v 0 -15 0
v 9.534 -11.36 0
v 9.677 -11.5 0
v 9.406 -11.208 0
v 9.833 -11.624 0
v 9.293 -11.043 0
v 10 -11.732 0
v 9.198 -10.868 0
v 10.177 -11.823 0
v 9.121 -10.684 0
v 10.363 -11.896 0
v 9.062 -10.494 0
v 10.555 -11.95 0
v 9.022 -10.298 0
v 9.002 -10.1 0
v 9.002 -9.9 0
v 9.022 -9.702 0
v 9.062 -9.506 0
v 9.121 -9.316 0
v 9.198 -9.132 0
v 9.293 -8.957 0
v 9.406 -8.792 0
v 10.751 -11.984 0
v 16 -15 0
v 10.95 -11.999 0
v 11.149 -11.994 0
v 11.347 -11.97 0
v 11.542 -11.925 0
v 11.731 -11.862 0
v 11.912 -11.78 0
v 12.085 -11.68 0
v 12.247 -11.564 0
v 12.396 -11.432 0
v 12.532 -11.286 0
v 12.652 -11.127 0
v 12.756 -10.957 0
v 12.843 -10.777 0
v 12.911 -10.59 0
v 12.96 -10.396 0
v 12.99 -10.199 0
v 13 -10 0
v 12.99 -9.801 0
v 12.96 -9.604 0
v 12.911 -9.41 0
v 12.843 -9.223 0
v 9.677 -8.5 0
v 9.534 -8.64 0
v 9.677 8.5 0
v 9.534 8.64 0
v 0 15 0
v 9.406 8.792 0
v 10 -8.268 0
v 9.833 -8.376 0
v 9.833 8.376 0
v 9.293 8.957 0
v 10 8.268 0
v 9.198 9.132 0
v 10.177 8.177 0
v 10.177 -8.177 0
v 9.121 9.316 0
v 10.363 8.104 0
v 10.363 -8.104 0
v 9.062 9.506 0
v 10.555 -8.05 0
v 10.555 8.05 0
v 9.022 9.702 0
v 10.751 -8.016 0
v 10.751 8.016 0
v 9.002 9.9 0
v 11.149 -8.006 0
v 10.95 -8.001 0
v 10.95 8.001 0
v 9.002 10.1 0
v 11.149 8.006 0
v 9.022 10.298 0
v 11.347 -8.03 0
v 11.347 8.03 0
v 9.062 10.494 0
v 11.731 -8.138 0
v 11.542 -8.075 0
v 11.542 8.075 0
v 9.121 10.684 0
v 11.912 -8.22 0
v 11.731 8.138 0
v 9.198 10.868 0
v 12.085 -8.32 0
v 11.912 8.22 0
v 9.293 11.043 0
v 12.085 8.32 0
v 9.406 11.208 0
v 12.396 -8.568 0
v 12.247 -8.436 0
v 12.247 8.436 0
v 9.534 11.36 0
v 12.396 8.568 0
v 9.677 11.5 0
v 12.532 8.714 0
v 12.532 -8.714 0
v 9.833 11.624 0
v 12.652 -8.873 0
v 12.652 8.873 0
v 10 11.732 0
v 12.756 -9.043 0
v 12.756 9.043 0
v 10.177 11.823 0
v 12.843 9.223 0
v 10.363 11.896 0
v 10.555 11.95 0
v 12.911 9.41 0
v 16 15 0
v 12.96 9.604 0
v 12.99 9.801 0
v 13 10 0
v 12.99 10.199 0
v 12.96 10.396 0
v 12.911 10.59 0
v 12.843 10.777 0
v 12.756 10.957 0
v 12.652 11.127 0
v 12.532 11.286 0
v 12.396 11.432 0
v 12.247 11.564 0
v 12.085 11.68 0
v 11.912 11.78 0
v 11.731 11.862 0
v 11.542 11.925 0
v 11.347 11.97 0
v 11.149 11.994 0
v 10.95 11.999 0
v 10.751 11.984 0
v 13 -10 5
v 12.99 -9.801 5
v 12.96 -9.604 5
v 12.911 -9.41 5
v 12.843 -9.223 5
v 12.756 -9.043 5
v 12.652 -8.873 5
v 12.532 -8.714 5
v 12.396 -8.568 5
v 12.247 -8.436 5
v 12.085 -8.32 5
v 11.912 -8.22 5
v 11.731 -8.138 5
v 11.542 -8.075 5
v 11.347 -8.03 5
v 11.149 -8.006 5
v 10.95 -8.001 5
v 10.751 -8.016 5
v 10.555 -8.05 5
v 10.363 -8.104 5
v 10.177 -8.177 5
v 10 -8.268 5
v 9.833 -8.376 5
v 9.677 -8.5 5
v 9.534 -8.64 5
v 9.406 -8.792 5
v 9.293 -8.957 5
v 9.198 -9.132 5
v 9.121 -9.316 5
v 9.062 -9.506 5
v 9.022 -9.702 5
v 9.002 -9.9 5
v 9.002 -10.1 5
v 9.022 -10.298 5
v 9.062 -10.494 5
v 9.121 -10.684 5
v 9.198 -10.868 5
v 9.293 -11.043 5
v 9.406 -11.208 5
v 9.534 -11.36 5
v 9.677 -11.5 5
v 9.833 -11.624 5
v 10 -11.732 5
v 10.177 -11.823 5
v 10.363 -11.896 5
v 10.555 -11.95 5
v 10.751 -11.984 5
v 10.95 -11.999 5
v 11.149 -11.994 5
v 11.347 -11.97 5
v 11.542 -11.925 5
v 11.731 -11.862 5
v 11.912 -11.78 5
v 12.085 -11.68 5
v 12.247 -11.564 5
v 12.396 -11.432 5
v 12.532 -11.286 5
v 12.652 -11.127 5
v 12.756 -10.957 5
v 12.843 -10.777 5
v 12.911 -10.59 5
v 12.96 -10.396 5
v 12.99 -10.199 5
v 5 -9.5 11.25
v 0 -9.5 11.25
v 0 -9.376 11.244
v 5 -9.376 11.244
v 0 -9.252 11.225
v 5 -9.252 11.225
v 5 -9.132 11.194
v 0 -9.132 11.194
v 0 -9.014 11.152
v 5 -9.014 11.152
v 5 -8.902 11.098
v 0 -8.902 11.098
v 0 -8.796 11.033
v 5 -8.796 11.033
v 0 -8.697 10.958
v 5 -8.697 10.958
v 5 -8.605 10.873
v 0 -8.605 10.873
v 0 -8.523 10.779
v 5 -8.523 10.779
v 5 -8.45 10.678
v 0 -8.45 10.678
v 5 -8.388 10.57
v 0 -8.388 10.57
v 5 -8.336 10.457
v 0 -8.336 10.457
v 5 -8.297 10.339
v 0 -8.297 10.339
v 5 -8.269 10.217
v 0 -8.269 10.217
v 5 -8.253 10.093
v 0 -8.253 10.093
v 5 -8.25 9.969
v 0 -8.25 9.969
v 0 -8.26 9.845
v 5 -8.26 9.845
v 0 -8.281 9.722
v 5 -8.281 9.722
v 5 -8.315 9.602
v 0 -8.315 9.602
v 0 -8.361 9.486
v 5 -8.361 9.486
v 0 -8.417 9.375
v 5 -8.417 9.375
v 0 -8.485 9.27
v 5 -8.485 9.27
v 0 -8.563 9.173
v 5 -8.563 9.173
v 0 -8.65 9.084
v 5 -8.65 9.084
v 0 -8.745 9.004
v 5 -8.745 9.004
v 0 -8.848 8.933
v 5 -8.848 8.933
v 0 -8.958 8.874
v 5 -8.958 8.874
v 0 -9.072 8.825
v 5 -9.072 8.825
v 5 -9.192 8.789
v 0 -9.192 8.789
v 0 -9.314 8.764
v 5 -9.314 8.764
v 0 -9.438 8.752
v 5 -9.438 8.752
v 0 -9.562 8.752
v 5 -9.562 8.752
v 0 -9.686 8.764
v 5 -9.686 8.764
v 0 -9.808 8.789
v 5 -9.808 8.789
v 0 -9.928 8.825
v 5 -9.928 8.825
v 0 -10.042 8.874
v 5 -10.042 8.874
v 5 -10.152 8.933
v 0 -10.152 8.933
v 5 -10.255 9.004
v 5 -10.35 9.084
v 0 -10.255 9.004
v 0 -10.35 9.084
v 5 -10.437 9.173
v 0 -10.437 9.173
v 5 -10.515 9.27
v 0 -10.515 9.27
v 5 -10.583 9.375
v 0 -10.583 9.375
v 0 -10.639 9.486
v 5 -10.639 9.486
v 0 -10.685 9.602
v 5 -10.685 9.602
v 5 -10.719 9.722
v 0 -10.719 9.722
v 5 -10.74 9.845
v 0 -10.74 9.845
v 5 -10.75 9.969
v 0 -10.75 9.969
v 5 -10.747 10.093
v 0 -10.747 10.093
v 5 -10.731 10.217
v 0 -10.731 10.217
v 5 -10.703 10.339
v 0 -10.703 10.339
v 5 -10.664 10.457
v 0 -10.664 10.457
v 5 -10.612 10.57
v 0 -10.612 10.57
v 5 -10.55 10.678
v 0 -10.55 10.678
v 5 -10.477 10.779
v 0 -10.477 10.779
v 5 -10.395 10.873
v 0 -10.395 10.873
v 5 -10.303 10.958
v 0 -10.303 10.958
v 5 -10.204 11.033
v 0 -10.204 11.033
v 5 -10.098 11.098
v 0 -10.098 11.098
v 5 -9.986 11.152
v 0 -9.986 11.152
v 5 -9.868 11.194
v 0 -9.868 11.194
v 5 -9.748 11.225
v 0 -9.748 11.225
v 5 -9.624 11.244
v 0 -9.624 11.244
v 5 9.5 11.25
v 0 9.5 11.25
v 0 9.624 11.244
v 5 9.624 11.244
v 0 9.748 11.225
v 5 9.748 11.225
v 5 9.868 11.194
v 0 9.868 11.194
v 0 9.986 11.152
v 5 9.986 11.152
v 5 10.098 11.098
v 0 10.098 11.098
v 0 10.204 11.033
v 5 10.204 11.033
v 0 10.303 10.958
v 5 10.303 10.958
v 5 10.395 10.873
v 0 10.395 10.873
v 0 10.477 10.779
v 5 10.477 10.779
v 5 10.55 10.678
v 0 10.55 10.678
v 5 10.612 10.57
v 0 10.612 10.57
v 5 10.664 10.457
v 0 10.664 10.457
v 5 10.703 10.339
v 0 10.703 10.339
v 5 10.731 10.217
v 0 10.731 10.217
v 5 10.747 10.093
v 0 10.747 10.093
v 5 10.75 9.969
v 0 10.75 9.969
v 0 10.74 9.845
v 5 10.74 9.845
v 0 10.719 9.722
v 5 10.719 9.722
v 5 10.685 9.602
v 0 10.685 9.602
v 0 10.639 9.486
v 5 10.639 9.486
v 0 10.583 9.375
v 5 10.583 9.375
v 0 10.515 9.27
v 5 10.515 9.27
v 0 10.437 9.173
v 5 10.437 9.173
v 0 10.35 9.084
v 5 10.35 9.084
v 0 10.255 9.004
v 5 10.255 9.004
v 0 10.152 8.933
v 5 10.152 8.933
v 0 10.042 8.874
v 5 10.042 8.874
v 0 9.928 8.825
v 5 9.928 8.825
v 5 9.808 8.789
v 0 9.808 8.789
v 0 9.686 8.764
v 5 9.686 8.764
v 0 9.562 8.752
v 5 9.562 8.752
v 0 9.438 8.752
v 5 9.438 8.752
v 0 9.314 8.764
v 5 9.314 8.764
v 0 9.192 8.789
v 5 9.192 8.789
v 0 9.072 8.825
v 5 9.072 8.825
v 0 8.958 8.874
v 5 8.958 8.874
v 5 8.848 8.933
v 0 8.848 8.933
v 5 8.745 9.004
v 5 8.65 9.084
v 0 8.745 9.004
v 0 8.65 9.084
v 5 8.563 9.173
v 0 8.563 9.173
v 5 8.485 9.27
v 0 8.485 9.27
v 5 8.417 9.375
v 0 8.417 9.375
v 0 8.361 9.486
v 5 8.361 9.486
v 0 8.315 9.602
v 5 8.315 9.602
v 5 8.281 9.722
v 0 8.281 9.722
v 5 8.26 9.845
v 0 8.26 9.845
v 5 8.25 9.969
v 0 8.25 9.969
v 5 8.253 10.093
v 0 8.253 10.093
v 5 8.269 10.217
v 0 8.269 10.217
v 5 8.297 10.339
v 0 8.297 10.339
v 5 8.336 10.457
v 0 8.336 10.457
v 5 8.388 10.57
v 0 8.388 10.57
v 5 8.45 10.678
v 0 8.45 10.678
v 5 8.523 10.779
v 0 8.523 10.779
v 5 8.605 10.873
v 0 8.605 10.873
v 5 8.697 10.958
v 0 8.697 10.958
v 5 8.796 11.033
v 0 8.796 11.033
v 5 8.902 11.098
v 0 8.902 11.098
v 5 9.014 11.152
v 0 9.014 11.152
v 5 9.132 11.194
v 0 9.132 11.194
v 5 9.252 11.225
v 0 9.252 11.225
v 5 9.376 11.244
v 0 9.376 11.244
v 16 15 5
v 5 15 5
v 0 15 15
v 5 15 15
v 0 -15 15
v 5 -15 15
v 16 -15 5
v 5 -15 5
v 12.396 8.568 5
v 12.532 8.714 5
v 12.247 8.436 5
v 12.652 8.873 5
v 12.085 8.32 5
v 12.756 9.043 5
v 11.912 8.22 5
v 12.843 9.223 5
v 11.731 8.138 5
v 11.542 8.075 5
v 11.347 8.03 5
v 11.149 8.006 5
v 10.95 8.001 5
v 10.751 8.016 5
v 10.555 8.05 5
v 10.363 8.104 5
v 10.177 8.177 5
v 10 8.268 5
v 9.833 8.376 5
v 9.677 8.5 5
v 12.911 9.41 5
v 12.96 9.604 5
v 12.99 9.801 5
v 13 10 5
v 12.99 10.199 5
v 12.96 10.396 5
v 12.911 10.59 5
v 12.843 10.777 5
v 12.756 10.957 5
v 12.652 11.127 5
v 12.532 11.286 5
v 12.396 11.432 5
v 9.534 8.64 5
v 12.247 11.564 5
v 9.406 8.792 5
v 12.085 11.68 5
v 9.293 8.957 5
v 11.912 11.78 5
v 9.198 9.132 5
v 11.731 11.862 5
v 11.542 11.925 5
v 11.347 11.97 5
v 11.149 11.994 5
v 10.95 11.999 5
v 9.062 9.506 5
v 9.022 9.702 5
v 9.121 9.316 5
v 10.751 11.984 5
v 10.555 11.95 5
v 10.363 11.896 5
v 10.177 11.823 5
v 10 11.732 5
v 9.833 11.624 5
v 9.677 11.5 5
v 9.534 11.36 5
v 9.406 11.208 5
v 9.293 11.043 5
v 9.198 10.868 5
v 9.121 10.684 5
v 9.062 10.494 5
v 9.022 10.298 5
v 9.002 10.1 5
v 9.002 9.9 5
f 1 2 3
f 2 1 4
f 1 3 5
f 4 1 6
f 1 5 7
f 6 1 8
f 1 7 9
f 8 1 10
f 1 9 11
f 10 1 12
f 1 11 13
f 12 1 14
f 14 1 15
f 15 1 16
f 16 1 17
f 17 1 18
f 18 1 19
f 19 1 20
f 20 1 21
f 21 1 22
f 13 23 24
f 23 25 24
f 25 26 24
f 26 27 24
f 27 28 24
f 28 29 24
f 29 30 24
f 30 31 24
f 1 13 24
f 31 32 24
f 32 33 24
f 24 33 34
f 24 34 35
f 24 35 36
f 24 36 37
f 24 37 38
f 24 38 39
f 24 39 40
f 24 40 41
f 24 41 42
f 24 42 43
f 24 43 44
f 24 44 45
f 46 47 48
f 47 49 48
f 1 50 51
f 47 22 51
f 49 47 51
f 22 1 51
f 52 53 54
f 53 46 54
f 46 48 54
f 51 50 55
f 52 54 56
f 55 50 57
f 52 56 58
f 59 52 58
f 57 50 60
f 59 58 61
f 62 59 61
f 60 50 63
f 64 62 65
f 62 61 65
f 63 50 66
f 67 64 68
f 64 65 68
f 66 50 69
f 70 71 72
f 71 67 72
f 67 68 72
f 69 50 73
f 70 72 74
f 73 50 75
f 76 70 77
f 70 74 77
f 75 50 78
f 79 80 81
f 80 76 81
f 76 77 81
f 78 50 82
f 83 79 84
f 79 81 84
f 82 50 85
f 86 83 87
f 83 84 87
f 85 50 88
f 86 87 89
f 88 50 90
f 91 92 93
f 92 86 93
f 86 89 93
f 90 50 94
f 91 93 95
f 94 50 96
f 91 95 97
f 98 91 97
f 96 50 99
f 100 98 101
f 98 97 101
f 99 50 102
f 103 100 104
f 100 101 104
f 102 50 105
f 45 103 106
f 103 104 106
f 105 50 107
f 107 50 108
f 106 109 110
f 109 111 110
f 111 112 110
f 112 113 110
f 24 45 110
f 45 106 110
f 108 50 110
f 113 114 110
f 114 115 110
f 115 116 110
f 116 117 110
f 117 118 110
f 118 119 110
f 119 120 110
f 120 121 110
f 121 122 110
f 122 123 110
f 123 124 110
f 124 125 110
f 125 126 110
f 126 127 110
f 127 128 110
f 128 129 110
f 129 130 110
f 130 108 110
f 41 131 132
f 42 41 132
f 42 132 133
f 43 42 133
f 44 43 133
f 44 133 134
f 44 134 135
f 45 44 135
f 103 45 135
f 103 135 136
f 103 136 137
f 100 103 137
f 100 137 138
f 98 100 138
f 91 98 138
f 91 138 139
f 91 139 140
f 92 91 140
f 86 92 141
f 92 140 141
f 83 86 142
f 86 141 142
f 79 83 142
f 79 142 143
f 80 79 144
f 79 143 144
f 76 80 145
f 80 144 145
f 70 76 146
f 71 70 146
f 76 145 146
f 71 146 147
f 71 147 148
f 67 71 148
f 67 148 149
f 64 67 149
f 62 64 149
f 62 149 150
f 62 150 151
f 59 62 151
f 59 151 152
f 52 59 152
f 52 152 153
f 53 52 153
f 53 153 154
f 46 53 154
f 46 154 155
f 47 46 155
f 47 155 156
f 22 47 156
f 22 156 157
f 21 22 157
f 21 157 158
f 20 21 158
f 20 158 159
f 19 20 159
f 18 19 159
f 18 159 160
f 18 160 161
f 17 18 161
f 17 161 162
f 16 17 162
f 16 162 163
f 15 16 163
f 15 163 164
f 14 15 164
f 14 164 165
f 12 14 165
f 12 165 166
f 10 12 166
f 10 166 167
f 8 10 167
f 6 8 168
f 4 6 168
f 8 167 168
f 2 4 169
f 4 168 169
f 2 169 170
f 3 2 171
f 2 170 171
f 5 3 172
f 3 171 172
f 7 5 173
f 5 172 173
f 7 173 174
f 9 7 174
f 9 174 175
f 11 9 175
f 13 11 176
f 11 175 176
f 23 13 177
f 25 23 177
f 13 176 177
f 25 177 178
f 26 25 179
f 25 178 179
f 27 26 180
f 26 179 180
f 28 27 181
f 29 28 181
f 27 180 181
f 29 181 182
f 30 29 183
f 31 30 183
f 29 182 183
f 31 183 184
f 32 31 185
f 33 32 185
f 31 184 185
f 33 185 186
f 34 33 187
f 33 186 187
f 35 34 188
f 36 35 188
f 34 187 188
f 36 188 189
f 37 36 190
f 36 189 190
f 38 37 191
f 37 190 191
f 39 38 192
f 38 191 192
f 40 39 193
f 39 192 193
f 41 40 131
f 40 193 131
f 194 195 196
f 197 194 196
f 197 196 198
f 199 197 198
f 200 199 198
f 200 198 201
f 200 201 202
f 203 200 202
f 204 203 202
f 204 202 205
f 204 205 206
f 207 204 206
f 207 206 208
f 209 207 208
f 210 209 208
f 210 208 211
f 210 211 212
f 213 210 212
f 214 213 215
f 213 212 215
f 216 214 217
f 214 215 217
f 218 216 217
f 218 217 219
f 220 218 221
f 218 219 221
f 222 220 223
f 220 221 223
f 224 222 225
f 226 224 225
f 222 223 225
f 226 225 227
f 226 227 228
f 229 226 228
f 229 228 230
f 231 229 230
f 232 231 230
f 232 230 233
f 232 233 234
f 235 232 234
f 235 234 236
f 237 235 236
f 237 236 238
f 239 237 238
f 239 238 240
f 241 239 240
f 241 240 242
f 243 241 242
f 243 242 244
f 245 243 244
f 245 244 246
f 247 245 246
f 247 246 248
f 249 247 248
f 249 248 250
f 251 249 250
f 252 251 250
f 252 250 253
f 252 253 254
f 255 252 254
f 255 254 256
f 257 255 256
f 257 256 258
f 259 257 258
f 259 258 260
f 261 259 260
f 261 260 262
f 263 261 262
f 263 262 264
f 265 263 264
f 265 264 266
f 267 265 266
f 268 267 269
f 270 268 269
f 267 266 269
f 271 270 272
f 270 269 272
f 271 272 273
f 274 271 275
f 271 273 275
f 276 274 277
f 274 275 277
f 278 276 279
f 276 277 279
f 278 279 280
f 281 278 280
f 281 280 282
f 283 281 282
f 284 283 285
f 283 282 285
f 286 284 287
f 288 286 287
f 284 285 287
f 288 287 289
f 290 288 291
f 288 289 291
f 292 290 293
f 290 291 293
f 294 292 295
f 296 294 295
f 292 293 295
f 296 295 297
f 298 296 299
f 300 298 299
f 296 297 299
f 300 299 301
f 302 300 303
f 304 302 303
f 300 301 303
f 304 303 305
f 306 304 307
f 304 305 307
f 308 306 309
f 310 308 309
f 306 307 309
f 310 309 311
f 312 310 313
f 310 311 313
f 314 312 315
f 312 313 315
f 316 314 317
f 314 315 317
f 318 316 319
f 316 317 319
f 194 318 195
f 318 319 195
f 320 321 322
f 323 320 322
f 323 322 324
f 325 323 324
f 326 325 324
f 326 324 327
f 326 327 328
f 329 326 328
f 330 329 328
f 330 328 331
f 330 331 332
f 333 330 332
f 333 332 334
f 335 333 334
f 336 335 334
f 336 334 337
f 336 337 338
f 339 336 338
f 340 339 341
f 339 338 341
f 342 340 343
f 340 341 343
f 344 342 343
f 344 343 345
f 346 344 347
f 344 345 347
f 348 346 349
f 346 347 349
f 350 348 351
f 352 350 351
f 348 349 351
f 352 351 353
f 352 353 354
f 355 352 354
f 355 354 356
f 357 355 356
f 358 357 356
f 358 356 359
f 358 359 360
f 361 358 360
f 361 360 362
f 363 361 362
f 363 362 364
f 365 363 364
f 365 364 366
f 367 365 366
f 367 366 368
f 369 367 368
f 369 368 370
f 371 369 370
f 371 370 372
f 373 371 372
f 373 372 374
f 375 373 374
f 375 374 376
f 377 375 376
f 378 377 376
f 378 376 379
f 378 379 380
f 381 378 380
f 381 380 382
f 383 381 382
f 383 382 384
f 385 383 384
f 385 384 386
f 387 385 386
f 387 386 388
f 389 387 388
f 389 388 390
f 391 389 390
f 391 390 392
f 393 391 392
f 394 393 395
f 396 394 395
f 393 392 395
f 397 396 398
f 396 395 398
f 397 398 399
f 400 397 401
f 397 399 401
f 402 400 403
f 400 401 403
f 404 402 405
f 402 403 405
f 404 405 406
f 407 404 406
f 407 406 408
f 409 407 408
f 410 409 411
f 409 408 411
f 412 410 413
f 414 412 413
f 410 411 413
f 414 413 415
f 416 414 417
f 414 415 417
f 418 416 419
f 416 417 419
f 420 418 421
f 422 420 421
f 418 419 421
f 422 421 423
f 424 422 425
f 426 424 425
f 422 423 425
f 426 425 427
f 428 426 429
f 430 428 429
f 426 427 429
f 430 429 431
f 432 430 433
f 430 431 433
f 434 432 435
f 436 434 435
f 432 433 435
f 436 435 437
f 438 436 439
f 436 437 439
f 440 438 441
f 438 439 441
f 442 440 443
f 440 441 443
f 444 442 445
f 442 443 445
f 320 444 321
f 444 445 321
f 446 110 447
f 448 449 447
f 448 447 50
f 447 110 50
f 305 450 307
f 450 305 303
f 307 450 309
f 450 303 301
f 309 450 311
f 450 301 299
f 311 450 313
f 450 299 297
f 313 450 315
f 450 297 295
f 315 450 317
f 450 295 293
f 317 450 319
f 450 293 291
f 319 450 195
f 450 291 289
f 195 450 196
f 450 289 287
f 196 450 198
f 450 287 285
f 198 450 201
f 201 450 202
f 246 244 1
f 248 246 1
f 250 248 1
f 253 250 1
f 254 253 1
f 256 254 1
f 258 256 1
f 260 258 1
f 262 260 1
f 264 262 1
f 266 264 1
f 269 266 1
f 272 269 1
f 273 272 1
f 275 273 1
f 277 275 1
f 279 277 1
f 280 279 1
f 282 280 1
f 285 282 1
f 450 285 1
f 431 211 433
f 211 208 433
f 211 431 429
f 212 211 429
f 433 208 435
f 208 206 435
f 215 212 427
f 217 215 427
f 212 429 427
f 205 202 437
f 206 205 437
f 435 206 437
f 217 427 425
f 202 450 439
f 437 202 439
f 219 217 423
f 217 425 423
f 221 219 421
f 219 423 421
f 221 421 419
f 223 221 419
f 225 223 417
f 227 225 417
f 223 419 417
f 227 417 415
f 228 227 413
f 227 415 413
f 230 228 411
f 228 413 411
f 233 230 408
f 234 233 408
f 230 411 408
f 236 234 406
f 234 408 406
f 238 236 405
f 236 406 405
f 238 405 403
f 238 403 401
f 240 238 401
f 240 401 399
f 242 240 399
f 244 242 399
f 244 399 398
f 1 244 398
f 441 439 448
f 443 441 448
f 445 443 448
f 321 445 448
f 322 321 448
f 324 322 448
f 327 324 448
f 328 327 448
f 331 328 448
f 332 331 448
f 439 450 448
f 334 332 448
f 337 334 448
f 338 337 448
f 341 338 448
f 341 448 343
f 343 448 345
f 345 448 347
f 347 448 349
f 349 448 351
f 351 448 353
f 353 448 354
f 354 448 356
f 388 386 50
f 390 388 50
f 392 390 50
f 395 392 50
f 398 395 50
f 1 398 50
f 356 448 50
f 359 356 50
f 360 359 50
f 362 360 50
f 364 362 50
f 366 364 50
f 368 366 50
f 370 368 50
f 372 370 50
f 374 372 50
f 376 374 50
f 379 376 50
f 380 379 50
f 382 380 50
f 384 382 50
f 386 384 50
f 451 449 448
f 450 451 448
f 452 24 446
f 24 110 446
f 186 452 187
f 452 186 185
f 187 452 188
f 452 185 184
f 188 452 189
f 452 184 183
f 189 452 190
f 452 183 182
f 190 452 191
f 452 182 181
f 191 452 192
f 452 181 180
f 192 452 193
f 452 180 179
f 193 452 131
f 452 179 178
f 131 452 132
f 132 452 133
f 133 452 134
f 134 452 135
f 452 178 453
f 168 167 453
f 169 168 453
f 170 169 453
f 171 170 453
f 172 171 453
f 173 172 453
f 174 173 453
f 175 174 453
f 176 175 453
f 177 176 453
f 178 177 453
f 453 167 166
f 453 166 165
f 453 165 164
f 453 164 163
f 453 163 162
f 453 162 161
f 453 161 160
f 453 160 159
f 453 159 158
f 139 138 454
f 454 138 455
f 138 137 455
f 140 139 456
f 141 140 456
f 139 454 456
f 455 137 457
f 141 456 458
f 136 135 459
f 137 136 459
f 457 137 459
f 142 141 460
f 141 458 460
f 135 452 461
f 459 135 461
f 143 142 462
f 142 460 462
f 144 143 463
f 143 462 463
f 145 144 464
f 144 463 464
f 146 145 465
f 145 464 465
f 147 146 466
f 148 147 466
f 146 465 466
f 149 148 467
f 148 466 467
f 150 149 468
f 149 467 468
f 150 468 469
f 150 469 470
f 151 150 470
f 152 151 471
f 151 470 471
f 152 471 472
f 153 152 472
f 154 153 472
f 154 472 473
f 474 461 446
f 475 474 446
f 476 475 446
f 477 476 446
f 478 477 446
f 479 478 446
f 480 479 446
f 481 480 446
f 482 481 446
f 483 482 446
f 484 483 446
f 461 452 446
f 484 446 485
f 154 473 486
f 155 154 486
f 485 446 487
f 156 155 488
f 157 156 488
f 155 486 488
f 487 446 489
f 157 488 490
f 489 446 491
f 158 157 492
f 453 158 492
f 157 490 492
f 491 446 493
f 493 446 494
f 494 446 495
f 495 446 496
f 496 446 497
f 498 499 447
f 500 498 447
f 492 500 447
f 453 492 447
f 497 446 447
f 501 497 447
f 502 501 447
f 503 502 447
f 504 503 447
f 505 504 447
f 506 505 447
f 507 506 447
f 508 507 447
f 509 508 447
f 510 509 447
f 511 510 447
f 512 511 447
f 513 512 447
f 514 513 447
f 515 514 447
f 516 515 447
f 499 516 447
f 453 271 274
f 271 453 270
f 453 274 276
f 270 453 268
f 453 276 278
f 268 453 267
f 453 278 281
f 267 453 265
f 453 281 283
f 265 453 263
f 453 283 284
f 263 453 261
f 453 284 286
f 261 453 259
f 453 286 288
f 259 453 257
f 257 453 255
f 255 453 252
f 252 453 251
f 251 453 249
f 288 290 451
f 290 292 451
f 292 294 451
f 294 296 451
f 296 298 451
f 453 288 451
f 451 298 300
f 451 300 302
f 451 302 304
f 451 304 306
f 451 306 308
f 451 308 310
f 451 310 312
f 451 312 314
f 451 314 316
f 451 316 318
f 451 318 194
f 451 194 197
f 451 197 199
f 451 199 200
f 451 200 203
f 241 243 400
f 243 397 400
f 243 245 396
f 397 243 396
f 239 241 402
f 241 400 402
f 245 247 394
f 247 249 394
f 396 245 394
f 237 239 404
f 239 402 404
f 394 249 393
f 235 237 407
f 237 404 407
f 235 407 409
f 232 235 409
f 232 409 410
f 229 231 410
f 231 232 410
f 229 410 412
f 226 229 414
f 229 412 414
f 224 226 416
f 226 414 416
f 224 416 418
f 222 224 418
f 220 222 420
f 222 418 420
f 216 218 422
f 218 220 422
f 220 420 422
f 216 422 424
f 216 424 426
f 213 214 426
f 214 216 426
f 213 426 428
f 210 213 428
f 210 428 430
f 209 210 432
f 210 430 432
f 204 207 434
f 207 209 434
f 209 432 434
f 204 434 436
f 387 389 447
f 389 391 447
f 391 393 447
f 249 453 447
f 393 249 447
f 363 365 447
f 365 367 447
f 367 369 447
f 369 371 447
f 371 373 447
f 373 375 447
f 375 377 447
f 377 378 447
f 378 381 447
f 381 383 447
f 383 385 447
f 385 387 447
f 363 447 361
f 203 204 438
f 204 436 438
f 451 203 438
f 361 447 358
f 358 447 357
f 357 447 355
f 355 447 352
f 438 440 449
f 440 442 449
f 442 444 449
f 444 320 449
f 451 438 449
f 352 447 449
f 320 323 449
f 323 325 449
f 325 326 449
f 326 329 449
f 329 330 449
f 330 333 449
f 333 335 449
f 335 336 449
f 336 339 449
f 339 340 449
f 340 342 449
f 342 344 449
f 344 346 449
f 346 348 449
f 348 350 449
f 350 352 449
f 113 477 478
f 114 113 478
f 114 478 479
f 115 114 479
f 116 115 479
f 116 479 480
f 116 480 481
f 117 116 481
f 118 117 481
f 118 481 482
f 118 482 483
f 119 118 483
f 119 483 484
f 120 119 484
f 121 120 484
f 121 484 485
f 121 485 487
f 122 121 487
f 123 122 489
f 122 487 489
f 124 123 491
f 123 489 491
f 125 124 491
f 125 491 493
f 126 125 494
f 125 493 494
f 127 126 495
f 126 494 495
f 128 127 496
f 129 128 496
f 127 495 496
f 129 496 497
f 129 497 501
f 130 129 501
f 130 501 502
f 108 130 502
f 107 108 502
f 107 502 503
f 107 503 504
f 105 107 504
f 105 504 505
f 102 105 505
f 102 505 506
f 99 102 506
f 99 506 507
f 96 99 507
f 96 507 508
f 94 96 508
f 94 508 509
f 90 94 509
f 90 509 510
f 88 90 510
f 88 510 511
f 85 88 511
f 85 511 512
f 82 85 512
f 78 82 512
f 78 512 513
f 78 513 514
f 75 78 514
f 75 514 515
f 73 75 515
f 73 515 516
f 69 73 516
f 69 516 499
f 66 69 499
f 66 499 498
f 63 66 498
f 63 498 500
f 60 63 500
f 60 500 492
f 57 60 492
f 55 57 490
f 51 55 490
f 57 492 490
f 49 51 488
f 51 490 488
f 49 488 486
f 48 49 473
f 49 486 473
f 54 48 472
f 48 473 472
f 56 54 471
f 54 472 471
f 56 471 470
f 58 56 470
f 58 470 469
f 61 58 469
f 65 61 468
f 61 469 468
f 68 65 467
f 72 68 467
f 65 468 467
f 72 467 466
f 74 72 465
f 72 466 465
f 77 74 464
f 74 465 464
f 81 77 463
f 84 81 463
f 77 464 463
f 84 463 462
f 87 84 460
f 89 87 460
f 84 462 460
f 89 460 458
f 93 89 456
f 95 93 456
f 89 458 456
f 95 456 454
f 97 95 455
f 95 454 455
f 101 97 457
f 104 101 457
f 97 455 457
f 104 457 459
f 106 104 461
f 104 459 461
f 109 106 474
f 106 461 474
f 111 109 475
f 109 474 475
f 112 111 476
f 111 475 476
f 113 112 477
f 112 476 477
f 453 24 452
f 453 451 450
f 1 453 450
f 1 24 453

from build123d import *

# Parameters (mm, degrees)
BOSS_EXTRUDE1_DEPTH = 15
SKETCH2_R           = 2
CUT_EXTRUDE1_DEPTH  = 25.103941586
SKETCH3_R           = 1.25
CUT_EXTRUDE2_DEPTH  = 27.570660511


with BuildPart() as part:
    # Sketch1 → Boss-Extrude1 (new, symmetric)
    with BuildSketch(Plane(origin=(0, 0, 0), x_dir=(1, 0, 0), z_dir=(0, 1, 0))):
        Polygon((0, 0), (16, 0), (16, -5), (5, -5), (5, -15), (0, -15), align=None)
    extrude(amount=BOSS_EXTRUDE1_DEPTH, both=True)

    # Sketch2 → Cut-Extrude1 (cut, through all)
    with BuildSketch(Plane.XY.offset(5)):
        with Locations((11, 10)):
            Circle(SKETCH2_R)
        with Locations((11, -10)):
            Circle(SKETCH2_R)
    extrude(amount=-CUT_EXTRUDE1_DEPTH, mode=Mode.SUBTRACT)

    # Sketch3 → Cut-Extrude2 (cut, through all)
    with BuildSketch(Plane.ZY):
        with Locations((10, 9.5)):
            Circle(SKETCH3_R)
        with Locations((10, -9.5)):
            Circle(SKETCH3_R)
    extrude(amount=-CUT_EXTRUDE2_DEPTH, mode=Mode.SUBTRACT)


solid = part.part
